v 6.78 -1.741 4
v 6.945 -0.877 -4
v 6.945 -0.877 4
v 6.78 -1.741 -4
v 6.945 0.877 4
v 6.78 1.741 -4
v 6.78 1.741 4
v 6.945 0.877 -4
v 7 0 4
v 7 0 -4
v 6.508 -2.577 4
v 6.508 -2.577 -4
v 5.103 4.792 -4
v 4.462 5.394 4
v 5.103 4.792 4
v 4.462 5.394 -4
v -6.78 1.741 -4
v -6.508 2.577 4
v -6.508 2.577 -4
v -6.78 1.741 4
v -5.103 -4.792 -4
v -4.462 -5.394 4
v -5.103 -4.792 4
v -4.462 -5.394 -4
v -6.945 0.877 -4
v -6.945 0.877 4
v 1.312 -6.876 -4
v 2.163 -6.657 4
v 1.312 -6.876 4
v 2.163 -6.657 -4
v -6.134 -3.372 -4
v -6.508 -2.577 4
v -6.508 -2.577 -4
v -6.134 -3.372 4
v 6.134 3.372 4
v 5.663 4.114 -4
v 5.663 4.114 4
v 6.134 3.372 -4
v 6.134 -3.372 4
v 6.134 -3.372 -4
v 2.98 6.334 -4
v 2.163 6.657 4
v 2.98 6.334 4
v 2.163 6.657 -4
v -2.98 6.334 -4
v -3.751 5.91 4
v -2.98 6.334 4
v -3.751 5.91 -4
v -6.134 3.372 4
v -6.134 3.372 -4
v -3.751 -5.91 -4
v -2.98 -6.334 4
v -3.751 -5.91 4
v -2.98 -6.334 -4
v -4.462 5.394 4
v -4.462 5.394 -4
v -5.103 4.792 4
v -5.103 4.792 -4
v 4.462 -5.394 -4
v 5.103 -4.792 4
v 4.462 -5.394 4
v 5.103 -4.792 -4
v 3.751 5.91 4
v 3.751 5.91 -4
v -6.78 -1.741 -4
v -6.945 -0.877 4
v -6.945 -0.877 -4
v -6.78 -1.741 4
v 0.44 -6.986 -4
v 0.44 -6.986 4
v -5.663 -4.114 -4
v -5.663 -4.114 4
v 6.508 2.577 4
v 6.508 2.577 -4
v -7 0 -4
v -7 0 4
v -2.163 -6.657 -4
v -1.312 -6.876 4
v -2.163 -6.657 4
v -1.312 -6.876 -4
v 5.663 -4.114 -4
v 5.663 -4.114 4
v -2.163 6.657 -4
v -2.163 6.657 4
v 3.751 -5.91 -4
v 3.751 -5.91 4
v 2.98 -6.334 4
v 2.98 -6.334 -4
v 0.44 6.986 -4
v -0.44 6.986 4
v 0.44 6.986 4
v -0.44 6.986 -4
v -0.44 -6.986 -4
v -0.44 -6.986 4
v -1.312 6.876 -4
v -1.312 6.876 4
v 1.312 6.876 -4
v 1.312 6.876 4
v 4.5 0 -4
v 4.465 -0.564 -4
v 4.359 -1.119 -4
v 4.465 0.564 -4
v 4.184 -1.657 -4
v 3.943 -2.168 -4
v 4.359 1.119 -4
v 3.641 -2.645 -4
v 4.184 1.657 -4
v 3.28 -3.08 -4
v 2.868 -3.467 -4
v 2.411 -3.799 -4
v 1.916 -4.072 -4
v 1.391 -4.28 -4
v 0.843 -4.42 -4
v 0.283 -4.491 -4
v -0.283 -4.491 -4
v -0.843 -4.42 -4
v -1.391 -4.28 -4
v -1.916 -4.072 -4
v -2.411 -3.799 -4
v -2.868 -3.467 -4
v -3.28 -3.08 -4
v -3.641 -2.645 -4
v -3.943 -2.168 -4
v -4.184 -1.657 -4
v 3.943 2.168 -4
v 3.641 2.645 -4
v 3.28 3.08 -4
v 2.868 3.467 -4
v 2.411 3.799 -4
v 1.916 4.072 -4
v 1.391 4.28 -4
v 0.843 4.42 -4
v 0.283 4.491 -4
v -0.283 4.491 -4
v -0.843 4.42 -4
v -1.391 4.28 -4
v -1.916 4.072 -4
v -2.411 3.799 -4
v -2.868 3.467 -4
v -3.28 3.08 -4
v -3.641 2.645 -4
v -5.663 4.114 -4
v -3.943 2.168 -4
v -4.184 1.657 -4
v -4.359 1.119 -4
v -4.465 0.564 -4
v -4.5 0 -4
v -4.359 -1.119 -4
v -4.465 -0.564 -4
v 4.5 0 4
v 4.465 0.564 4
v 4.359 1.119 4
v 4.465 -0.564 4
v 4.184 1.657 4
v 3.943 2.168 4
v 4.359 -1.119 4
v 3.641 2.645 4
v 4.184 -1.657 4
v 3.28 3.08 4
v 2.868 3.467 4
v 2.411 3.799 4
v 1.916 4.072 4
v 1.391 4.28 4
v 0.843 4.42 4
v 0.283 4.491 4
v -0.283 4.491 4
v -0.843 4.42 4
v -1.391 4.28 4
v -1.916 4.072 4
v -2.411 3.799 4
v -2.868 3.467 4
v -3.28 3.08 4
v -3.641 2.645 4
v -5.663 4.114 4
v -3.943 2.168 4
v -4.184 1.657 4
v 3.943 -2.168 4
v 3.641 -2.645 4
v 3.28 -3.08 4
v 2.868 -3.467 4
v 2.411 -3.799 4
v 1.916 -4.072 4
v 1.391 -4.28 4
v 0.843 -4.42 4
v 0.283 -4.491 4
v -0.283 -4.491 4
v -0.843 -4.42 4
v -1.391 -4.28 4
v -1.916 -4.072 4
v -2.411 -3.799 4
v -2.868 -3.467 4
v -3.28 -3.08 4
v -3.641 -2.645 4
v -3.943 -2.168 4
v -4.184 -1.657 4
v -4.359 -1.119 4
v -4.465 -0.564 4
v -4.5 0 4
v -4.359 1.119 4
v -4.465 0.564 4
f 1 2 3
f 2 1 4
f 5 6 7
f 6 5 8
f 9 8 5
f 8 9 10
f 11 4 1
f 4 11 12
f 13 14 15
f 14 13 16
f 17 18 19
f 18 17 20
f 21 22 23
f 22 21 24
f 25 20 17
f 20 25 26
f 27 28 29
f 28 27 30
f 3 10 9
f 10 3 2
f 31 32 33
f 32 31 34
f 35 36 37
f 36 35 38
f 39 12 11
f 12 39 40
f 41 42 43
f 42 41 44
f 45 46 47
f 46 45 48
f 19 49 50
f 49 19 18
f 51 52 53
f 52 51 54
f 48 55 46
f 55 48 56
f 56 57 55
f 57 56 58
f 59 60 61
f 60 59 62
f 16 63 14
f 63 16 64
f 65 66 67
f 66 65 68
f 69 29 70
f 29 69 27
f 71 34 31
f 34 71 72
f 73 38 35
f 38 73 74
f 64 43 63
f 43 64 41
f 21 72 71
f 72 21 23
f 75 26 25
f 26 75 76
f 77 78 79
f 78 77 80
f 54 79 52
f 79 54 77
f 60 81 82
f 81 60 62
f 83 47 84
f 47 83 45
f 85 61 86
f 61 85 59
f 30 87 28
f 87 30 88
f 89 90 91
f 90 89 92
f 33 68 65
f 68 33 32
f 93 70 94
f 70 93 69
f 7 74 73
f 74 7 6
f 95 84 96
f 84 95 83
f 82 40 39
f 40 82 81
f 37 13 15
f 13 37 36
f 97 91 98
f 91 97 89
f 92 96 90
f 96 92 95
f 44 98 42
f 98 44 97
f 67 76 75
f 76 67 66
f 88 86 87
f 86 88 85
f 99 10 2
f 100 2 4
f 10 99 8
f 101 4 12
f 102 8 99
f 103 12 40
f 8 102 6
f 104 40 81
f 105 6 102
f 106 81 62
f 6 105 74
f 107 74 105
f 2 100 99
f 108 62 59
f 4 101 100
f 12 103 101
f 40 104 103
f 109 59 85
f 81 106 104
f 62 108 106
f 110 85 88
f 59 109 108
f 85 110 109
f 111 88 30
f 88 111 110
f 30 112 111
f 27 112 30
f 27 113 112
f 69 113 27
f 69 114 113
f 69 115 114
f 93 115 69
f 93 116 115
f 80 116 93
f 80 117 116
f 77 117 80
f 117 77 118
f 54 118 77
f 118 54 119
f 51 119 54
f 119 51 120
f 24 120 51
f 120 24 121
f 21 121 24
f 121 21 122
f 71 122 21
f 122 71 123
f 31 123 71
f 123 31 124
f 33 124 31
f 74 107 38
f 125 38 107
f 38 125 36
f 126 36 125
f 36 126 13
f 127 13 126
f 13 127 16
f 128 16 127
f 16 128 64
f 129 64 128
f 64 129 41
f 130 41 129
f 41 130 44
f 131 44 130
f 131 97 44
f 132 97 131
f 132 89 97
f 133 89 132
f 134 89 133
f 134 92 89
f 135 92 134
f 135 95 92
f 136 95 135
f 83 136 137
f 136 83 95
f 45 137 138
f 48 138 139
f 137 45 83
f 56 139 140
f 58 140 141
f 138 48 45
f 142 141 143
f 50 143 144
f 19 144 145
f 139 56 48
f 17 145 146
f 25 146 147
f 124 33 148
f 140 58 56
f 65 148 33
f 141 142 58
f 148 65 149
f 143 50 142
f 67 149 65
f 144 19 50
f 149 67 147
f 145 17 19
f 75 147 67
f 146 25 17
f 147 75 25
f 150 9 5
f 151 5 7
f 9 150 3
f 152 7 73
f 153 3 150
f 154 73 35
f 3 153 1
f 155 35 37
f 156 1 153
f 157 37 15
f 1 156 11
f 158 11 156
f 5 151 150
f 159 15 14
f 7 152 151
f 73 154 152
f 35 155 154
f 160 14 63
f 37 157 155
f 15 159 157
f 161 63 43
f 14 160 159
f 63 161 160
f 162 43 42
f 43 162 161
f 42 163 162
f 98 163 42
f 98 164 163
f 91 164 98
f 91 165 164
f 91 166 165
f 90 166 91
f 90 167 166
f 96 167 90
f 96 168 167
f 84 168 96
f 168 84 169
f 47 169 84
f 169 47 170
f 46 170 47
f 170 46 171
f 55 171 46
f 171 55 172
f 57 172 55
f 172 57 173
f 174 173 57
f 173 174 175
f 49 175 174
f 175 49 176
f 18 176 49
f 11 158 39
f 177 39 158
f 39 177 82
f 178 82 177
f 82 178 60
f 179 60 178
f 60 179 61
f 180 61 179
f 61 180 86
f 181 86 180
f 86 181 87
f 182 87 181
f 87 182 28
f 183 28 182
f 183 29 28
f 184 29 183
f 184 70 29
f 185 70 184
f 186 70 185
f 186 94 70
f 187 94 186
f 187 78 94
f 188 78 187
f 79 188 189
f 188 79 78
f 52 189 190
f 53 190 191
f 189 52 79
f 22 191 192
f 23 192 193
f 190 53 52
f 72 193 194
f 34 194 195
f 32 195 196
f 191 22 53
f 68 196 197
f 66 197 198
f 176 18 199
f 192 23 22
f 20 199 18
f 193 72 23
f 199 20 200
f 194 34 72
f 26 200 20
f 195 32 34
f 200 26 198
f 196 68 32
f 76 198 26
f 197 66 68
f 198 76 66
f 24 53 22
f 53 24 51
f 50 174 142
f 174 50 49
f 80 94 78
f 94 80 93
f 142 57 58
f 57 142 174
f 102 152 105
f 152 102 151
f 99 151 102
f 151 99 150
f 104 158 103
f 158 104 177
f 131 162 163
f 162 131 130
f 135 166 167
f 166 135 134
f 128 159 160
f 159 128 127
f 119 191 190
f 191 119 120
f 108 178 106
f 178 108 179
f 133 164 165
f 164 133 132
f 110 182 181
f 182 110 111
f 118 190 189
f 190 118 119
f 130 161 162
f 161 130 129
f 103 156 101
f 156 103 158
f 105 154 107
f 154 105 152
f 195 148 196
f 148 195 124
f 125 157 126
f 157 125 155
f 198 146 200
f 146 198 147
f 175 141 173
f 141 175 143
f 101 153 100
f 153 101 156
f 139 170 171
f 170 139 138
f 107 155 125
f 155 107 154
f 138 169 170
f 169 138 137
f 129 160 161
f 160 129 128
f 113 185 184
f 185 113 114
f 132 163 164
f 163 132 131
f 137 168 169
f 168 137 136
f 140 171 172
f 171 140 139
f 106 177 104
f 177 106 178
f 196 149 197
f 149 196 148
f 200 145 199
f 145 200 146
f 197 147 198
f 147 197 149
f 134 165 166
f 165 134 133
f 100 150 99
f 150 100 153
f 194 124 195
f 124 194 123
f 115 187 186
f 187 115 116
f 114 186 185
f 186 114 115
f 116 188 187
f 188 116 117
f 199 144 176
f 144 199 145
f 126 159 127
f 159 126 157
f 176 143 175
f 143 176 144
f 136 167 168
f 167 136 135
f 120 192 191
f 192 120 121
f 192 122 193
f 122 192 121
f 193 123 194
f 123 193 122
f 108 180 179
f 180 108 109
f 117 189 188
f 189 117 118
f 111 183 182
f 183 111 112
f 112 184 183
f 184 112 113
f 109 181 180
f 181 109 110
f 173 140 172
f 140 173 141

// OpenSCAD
$fn = 50;


difference() {
	union() {
		translate(v = [0, 0, -4.0000000000]) {
			cylinder(h = 8, r = 7.0000000000);
		}
	}
	union() {
		translate(v = [0, 0, -100.0000000000]) {
			cylinder(h = 200, r = 4.5000000000);
		}
	}
}
